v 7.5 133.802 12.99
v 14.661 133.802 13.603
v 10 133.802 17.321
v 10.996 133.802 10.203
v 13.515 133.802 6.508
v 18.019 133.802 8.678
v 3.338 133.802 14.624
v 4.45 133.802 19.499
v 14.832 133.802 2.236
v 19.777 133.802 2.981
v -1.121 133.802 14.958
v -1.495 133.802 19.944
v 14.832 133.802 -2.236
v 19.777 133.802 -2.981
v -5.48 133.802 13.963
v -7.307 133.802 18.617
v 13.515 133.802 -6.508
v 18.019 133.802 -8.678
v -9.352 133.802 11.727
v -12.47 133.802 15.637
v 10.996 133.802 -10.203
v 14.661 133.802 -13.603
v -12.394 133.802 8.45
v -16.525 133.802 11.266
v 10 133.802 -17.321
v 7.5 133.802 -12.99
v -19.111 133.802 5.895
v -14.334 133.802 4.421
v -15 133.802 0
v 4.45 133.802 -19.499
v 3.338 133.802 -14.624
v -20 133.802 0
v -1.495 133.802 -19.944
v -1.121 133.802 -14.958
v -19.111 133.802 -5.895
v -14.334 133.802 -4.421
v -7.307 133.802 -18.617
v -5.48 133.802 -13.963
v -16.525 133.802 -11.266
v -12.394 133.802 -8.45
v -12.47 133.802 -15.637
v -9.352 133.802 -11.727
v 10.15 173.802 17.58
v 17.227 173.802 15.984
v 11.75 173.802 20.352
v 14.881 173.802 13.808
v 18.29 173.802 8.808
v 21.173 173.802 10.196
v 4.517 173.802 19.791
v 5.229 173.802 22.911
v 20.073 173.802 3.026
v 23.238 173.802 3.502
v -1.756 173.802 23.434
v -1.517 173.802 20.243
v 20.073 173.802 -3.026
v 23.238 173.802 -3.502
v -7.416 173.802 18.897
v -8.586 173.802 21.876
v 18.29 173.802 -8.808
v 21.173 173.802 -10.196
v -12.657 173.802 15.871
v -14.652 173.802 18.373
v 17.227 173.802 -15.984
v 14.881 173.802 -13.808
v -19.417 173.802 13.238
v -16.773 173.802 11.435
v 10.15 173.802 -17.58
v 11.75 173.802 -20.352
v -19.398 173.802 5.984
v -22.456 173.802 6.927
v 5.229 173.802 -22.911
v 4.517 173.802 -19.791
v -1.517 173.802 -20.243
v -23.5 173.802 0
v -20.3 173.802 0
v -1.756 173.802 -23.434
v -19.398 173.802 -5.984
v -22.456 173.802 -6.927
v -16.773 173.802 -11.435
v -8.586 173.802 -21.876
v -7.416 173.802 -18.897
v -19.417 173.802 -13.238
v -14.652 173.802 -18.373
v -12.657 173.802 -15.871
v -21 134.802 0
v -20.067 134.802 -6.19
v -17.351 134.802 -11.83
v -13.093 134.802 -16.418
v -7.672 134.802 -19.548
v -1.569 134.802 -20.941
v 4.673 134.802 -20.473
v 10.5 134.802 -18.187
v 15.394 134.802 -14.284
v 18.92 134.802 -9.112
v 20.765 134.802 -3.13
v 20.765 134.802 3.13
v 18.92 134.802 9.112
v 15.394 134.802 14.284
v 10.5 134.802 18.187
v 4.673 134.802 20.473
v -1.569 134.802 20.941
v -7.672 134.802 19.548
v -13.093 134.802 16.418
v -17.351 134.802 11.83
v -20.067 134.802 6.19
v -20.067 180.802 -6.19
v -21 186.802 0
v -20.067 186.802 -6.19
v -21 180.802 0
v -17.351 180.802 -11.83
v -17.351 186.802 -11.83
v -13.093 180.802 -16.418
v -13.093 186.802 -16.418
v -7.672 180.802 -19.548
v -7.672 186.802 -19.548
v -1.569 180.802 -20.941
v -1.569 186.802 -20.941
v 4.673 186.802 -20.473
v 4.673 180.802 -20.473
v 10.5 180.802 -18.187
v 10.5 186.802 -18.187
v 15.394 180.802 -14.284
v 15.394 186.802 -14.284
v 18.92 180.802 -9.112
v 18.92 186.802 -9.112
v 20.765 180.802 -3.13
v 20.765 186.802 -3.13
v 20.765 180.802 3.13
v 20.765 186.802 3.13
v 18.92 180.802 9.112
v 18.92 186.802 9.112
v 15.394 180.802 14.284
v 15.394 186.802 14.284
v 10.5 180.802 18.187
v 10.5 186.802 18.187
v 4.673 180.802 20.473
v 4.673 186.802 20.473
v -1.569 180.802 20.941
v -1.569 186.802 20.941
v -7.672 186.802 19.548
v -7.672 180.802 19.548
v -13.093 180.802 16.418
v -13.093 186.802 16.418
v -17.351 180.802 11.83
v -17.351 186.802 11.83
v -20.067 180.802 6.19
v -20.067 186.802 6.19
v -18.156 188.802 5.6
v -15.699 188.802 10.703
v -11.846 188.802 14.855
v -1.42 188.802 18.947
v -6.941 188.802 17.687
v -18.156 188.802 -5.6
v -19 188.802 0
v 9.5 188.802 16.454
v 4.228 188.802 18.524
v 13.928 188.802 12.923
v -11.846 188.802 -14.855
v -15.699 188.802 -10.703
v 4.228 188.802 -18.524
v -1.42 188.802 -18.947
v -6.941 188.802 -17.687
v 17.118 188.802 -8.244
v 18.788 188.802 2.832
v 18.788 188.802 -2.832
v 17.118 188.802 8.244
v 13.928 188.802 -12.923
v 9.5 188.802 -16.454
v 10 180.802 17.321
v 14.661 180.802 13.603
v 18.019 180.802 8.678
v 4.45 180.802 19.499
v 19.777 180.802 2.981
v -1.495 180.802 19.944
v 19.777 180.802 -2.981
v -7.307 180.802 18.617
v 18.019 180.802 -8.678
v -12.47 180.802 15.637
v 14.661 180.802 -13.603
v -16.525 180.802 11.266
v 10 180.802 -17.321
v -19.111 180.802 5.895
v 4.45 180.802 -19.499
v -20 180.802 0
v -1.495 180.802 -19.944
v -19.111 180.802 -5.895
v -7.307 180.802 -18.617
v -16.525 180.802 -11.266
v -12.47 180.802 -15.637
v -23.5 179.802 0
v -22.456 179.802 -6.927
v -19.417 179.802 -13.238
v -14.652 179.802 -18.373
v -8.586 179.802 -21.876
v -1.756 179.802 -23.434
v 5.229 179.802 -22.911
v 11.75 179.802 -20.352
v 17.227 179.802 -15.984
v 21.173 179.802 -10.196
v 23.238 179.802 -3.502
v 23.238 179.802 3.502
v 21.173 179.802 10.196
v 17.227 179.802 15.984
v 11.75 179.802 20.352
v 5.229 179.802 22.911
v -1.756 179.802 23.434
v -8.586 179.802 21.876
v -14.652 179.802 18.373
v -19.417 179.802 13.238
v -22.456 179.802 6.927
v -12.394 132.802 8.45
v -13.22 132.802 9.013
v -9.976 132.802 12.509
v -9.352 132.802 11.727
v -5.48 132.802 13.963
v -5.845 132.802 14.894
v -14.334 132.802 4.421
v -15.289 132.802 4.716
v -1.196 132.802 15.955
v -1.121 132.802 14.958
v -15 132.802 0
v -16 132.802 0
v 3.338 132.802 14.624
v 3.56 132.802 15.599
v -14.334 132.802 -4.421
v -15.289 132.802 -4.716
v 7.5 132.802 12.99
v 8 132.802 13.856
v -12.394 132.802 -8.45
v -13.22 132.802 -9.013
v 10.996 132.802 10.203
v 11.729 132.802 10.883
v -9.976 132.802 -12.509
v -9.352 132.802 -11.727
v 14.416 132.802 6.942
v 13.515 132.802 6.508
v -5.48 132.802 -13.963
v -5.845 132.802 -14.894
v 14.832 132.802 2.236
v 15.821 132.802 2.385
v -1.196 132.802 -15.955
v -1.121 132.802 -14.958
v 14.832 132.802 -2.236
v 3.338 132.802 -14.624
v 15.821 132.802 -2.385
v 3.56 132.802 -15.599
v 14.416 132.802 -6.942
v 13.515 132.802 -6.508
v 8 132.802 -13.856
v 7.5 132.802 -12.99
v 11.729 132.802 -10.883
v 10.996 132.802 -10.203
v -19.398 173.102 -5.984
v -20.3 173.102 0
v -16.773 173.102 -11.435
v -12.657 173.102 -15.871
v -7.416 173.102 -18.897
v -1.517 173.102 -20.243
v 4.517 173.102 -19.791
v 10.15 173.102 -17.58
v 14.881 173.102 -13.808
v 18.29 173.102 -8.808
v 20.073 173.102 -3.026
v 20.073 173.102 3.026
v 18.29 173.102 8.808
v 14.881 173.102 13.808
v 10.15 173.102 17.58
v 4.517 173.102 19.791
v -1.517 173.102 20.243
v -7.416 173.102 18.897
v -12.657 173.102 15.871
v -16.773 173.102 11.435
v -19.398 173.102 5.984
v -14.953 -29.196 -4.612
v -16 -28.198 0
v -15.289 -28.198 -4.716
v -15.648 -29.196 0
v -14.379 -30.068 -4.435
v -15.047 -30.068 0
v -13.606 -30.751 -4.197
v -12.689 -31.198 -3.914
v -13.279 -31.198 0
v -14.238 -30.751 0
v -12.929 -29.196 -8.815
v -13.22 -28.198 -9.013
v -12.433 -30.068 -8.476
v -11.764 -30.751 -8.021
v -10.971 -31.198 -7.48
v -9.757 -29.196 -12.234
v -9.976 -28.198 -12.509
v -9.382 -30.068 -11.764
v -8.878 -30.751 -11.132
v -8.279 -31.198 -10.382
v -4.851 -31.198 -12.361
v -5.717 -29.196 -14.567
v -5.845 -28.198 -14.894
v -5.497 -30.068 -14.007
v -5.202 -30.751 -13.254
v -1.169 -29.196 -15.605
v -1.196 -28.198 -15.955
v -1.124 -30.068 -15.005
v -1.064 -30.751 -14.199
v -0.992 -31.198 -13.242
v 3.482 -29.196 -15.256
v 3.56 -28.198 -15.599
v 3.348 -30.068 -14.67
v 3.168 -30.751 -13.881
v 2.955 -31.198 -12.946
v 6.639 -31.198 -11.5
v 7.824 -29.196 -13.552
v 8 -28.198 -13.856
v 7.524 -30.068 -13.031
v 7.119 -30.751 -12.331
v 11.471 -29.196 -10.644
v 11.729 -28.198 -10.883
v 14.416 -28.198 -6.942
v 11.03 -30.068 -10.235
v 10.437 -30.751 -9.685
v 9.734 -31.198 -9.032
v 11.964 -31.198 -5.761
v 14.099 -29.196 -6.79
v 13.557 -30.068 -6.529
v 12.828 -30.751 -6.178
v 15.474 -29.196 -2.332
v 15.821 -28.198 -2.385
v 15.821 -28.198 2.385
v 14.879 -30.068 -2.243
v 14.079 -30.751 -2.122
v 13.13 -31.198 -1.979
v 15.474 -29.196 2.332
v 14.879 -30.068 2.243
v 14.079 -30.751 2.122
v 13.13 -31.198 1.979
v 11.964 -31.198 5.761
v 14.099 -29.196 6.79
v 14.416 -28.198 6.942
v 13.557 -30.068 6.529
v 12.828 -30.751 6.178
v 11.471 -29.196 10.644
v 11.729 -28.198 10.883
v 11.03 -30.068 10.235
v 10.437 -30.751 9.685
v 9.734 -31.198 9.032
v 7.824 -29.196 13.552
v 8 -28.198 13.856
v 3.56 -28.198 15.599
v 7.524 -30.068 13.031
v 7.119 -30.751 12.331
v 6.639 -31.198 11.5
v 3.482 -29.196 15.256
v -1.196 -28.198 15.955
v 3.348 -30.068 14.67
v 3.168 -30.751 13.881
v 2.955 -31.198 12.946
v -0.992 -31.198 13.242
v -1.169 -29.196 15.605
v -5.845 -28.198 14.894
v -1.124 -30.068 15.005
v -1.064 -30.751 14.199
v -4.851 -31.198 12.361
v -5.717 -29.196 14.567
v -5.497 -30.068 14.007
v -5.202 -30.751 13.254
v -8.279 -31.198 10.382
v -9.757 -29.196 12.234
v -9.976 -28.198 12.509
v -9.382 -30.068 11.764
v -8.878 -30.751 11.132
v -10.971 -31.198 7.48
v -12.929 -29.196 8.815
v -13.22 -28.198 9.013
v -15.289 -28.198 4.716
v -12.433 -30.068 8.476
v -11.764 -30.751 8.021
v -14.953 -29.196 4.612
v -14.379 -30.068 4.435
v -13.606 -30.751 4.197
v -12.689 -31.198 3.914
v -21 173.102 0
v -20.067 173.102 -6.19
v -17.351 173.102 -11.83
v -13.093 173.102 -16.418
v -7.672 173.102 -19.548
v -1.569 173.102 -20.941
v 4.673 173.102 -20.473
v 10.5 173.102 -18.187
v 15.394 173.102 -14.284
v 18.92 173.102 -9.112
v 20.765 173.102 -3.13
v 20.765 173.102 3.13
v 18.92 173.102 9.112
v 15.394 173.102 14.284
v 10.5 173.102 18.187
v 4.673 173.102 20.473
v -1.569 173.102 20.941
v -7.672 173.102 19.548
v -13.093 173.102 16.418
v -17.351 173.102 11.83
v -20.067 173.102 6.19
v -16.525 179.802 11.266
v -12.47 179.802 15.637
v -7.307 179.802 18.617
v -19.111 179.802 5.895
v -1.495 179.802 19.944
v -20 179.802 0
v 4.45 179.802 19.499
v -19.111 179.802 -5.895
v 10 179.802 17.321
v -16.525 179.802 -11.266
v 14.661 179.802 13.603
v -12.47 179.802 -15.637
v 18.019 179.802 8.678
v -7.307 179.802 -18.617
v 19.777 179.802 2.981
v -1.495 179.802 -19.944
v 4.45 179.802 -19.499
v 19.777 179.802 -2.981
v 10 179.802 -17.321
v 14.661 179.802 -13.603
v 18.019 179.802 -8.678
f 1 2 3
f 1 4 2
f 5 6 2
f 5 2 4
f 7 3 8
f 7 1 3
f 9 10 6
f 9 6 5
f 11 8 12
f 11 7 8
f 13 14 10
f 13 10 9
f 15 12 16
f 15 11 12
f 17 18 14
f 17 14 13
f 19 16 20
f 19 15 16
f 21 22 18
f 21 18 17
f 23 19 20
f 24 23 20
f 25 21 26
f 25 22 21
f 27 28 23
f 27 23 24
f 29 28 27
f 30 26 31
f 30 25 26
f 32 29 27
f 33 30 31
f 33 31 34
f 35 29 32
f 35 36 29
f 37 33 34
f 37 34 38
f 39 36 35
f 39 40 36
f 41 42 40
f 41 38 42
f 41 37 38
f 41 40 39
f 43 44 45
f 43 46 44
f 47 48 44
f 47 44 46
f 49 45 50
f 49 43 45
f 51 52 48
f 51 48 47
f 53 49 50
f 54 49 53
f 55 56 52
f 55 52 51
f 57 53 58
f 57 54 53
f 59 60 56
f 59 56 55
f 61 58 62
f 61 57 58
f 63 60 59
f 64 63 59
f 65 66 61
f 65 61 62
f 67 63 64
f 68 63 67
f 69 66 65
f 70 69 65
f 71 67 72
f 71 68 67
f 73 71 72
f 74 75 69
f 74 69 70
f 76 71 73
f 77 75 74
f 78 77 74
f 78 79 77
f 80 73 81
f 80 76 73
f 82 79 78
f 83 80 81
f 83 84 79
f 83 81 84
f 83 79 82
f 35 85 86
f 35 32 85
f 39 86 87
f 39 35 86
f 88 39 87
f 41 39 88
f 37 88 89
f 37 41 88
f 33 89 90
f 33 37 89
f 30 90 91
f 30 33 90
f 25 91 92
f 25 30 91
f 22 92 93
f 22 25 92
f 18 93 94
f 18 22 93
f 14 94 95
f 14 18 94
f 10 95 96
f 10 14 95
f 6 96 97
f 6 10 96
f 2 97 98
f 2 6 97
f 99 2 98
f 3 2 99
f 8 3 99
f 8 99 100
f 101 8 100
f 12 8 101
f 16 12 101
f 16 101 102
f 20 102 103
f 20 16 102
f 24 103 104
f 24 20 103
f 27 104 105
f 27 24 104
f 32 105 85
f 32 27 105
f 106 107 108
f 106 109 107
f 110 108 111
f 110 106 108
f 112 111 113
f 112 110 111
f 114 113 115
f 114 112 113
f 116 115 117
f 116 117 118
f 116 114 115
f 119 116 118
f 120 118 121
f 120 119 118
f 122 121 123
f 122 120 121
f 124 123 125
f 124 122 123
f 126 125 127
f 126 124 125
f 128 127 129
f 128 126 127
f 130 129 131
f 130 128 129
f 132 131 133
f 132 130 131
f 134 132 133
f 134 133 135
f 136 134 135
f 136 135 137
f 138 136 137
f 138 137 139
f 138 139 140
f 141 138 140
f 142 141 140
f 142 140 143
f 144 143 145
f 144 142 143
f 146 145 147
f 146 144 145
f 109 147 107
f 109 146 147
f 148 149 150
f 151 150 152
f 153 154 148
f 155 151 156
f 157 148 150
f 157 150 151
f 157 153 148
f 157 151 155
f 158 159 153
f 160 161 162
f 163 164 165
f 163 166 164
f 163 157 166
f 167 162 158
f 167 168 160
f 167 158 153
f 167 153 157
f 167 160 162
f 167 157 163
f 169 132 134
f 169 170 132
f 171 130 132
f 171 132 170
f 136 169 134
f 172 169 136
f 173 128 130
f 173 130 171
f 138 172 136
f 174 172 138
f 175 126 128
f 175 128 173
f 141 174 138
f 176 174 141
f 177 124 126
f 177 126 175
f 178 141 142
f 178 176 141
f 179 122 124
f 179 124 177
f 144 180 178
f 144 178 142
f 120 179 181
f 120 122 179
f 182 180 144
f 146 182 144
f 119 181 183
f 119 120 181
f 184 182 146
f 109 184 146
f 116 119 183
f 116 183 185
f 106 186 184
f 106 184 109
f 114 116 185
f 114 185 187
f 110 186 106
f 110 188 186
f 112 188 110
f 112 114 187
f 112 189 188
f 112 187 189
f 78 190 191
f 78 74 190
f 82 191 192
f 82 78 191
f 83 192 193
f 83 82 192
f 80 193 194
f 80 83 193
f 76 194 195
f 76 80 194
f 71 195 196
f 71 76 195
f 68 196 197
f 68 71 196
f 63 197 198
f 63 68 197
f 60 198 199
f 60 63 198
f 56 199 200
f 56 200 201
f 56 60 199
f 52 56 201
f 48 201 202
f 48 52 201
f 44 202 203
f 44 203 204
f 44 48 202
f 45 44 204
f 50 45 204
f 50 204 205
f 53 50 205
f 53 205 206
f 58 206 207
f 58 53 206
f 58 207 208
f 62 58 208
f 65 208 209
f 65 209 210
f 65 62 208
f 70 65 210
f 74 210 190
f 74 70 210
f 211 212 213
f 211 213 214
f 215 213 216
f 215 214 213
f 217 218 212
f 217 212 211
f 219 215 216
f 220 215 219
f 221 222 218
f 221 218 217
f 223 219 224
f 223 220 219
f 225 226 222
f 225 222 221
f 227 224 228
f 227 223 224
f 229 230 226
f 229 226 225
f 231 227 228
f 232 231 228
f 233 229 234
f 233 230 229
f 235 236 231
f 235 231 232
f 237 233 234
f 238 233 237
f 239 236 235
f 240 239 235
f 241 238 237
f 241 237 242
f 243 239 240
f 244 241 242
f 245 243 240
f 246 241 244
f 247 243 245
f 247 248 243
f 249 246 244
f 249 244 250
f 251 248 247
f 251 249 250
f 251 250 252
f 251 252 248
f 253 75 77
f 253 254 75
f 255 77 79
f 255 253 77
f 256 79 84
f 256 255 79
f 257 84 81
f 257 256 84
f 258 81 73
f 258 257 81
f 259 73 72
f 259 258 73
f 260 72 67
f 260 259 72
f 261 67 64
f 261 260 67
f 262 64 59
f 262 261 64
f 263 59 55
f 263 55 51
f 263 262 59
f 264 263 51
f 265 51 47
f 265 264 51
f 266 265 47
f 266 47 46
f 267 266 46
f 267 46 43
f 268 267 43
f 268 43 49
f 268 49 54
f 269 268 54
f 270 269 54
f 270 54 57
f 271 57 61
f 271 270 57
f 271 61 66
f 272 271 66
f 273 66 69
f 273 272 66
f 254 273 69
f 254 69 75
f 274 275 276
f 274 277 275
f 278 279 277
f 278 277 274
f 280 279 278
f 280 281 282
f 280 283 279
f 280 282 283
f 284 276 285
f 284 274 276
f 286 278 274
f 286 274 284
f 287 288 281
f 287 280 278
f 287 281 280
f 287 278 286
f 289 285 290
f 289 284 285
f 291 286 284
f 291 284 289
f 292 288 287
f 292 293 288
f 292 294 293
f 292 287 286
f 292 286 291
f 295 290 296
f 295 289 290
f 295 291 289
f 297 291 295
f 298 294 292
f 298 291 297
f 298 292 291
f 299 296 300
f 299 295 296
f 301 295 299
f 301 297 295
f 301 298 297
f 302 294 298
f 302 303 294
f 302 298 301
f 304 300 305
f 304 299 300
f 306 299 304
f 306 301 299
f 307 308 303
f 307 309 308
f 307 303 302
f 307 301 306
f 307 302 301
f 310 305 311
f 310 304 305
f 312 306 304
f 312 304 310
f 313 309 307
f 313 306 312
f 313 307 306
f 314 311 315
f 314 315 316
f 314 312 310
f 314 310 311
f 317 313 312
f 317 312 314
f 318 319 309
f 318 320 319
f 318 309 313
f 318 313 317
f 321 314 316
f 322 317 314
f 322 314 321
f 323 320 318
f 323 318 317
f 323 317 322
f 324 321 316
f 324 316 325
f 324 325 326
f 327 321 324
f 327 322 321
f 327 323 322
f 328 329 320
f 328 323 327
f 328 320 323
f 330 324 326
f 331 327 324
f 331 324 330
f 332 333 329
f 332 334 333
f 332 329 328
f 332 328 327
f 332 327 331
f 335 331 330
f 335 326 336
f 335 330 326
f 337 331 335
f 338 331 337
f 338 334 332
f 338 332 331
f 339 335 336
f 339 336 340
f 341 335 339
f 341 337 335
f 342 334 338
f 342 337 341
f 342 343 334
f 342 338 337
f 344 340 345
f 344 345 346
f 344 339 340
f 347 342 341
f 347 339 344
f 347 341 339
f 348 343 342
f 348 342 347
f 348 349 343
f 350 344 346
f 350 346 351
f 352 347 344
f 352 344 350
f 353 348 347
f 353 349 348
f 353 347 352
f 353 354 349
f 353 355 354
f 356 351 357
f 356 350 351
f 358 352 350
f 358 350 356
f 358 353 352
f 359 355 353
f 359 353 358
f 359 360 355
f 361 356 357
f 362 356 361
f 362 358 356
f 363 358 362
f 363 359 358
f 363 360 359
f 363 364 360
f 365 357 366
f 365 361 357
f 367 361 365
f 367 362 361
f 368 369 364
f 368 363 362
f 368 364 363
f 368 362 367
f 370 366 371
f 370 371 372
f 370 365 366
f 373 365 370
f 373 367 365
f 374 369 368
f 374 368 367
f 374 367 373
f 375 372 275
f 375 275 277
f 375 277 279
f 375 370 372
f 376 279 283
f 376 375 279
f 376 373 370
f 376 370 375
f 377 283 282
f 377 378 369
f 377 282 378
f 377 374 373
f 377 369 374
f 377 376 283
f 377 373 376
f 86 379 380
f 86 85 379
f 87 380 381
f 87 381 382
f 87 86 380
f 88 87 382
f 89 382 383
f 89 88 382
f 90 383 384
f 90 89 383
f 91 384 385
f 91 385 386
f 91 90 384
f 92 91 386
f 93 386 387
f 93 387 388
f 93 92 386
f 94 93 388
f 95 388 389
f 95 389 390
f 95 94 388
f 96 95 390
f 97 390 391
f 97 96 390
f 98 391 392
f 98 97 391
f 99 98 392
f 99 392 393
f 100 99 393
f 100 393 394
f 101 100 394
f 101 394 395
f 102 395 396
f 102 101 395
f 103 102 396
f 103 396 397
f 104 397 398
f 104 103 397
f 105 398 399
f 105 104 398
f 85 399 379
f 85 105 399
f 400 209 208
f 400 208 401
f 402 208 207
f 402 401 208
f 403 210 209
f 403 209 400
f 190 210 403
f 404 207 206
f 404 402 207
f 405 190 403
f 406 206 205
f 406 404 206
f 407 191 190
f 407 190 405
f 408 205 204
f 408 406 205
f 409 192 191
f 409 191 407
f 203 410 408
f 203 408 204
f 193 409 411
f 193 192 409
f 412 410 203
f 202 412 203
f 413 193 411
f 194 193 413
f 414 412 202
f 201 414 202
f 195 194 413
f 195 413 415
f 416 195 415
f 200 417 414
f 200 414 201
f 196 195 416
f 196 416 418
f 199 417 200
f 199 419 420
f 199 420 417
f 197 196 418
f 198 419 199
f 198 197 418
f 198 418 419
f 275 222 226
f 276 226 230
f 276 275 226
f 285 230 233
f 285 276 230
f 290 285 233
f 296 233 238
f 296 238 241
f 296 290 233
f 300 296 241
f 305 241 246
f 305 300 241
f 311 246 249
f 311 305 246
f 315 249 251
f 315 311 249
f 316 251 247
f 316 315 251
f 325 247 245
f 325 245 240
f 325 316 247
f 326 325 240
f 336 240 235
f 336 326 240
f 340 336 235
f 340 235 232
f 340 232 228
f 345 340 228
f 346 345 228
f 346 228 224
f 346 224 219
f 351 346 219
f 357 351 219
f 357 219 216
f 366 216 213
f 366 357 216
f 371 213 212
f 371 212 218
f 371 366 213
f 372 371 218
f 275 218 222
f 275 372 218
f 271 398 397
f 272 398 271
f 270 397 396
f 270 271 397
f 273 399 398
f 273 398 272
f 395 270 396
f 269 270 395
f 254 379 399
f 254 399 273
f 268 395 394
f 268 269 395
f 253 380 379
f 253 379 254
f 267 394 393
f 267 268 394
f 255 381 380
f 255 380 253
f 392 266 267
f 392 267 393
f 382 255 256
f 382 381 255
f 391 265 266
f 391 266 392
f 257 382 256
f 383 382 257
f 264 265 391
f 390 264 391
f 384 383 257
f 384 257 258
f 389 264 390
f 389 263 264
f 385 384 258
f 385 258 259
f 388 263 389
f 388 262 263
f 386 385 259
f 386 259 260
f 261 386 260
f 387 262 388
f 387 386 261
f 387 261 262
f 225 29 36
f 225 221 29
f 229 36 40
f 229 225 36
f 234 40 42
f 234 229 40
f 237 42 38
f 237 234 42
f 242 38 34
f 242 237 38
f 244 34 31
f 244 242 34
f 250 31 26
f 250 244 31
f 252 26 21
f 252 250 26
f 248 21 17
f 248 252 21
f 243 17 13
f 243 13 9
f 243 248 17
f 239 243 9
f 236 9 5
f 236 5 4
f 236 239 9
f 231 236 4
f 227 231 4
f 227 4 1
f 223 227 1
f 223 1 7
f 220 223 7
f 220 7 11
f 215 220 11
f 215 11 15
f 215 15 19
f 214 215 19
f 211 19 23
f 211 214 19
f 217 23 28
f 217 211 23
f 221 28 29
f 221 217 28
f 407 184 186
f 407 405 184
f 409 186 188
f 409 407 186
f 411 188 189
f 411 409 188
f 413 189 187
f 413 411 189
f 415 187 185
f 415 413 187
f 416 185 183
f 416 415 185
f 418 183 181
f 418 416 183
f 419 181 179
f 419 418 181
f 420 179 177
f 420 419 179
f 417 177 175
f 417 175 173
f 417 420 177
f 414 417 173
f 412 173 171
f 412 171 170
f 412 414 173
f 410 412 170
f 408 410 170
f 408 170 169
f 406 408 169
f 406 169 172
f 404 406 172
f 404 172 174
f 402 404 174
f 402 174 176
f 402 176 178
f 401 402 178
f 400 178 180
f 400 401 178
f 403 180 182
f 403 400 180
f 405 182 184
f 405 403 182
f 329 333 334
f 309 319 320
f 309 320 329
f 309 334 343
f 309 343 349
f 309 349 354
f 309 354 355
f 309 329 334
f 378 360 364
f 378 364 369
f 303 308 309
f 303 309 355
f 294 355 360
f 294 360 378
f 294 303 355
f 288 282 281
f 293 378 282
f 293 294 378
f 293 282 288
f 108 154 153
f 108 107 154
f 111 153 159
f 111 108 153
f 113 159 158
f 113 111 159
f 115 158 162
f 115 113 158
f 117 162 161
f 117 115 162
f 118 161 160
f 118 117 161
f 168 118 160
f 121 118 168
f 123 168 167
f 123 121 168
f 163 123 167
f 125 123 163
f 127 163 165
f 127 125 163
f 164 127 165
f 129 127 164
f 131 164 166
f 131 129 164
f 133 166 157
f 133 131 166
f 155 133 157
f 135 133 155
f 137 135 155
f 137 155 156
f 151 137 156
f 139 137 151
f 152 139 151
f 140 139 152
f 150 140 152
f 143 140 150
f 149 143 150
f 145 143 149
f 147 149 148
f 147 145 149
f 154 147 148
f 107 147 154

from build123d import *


with BuildPart() as part:
    # Szkic1 → Obrót2 (revolve)
    with BuildSketch(Plane.XY):
        with BuildLine():
            Line((0, 188.802213019), (-19, 188.802213019))
            Line((-19, 188.802213019), (-21, 186.802213019))
            Line((-21, 186.802213019), (-21, 180.802213019))
            Line((-21, 180.802213019), (-20, 180.802213019))
            Line((-20, 180.802213019), (-20, 179.802213019))
            Line((-20, 179.802213019), (-23.5, 179.802213019))
            Line((-23.5, 179.802213019), (-23.5, 173.802213019))
            Line((-23.5, 173.802213019), (-21, 173.802213019))
            Line((-21, 173.802213019), (-20.3, 173.802213019))
            Line((-20.3, 173.802213019), (-20.3, 173.102213019))
            Line((-20.3, 173.102213019), (-21, 173.102213019))
            Line((-21, 173.102213019), (-21, 134.802213019))
            Line((-21, 134.802213019), (-20, 133.802213019))
            Line((-20, 133.802213019), (-15, 133.802213019))
            Line((-15, 133.802213019), (-15, 132.802213019))
            Line((-15, 132.802213019), (-16, 132.802213019))
            Line((-16, 132.802213019), (-16, -28.197786981))
            ThreePointArc((-16, -28.197786981), (-15.047167049, -30.067674085), (-13.278774205, -31.197786981))
            Line((-13.278774205, -31.197786981), (0, -31.197786981))
            Line((0, -31.197786981), (0, 188.802213019))
        make_face()
    revolve(axis=Axis((0, 188.802213019, 0), (0, -1, 0)))


solid = part.part
